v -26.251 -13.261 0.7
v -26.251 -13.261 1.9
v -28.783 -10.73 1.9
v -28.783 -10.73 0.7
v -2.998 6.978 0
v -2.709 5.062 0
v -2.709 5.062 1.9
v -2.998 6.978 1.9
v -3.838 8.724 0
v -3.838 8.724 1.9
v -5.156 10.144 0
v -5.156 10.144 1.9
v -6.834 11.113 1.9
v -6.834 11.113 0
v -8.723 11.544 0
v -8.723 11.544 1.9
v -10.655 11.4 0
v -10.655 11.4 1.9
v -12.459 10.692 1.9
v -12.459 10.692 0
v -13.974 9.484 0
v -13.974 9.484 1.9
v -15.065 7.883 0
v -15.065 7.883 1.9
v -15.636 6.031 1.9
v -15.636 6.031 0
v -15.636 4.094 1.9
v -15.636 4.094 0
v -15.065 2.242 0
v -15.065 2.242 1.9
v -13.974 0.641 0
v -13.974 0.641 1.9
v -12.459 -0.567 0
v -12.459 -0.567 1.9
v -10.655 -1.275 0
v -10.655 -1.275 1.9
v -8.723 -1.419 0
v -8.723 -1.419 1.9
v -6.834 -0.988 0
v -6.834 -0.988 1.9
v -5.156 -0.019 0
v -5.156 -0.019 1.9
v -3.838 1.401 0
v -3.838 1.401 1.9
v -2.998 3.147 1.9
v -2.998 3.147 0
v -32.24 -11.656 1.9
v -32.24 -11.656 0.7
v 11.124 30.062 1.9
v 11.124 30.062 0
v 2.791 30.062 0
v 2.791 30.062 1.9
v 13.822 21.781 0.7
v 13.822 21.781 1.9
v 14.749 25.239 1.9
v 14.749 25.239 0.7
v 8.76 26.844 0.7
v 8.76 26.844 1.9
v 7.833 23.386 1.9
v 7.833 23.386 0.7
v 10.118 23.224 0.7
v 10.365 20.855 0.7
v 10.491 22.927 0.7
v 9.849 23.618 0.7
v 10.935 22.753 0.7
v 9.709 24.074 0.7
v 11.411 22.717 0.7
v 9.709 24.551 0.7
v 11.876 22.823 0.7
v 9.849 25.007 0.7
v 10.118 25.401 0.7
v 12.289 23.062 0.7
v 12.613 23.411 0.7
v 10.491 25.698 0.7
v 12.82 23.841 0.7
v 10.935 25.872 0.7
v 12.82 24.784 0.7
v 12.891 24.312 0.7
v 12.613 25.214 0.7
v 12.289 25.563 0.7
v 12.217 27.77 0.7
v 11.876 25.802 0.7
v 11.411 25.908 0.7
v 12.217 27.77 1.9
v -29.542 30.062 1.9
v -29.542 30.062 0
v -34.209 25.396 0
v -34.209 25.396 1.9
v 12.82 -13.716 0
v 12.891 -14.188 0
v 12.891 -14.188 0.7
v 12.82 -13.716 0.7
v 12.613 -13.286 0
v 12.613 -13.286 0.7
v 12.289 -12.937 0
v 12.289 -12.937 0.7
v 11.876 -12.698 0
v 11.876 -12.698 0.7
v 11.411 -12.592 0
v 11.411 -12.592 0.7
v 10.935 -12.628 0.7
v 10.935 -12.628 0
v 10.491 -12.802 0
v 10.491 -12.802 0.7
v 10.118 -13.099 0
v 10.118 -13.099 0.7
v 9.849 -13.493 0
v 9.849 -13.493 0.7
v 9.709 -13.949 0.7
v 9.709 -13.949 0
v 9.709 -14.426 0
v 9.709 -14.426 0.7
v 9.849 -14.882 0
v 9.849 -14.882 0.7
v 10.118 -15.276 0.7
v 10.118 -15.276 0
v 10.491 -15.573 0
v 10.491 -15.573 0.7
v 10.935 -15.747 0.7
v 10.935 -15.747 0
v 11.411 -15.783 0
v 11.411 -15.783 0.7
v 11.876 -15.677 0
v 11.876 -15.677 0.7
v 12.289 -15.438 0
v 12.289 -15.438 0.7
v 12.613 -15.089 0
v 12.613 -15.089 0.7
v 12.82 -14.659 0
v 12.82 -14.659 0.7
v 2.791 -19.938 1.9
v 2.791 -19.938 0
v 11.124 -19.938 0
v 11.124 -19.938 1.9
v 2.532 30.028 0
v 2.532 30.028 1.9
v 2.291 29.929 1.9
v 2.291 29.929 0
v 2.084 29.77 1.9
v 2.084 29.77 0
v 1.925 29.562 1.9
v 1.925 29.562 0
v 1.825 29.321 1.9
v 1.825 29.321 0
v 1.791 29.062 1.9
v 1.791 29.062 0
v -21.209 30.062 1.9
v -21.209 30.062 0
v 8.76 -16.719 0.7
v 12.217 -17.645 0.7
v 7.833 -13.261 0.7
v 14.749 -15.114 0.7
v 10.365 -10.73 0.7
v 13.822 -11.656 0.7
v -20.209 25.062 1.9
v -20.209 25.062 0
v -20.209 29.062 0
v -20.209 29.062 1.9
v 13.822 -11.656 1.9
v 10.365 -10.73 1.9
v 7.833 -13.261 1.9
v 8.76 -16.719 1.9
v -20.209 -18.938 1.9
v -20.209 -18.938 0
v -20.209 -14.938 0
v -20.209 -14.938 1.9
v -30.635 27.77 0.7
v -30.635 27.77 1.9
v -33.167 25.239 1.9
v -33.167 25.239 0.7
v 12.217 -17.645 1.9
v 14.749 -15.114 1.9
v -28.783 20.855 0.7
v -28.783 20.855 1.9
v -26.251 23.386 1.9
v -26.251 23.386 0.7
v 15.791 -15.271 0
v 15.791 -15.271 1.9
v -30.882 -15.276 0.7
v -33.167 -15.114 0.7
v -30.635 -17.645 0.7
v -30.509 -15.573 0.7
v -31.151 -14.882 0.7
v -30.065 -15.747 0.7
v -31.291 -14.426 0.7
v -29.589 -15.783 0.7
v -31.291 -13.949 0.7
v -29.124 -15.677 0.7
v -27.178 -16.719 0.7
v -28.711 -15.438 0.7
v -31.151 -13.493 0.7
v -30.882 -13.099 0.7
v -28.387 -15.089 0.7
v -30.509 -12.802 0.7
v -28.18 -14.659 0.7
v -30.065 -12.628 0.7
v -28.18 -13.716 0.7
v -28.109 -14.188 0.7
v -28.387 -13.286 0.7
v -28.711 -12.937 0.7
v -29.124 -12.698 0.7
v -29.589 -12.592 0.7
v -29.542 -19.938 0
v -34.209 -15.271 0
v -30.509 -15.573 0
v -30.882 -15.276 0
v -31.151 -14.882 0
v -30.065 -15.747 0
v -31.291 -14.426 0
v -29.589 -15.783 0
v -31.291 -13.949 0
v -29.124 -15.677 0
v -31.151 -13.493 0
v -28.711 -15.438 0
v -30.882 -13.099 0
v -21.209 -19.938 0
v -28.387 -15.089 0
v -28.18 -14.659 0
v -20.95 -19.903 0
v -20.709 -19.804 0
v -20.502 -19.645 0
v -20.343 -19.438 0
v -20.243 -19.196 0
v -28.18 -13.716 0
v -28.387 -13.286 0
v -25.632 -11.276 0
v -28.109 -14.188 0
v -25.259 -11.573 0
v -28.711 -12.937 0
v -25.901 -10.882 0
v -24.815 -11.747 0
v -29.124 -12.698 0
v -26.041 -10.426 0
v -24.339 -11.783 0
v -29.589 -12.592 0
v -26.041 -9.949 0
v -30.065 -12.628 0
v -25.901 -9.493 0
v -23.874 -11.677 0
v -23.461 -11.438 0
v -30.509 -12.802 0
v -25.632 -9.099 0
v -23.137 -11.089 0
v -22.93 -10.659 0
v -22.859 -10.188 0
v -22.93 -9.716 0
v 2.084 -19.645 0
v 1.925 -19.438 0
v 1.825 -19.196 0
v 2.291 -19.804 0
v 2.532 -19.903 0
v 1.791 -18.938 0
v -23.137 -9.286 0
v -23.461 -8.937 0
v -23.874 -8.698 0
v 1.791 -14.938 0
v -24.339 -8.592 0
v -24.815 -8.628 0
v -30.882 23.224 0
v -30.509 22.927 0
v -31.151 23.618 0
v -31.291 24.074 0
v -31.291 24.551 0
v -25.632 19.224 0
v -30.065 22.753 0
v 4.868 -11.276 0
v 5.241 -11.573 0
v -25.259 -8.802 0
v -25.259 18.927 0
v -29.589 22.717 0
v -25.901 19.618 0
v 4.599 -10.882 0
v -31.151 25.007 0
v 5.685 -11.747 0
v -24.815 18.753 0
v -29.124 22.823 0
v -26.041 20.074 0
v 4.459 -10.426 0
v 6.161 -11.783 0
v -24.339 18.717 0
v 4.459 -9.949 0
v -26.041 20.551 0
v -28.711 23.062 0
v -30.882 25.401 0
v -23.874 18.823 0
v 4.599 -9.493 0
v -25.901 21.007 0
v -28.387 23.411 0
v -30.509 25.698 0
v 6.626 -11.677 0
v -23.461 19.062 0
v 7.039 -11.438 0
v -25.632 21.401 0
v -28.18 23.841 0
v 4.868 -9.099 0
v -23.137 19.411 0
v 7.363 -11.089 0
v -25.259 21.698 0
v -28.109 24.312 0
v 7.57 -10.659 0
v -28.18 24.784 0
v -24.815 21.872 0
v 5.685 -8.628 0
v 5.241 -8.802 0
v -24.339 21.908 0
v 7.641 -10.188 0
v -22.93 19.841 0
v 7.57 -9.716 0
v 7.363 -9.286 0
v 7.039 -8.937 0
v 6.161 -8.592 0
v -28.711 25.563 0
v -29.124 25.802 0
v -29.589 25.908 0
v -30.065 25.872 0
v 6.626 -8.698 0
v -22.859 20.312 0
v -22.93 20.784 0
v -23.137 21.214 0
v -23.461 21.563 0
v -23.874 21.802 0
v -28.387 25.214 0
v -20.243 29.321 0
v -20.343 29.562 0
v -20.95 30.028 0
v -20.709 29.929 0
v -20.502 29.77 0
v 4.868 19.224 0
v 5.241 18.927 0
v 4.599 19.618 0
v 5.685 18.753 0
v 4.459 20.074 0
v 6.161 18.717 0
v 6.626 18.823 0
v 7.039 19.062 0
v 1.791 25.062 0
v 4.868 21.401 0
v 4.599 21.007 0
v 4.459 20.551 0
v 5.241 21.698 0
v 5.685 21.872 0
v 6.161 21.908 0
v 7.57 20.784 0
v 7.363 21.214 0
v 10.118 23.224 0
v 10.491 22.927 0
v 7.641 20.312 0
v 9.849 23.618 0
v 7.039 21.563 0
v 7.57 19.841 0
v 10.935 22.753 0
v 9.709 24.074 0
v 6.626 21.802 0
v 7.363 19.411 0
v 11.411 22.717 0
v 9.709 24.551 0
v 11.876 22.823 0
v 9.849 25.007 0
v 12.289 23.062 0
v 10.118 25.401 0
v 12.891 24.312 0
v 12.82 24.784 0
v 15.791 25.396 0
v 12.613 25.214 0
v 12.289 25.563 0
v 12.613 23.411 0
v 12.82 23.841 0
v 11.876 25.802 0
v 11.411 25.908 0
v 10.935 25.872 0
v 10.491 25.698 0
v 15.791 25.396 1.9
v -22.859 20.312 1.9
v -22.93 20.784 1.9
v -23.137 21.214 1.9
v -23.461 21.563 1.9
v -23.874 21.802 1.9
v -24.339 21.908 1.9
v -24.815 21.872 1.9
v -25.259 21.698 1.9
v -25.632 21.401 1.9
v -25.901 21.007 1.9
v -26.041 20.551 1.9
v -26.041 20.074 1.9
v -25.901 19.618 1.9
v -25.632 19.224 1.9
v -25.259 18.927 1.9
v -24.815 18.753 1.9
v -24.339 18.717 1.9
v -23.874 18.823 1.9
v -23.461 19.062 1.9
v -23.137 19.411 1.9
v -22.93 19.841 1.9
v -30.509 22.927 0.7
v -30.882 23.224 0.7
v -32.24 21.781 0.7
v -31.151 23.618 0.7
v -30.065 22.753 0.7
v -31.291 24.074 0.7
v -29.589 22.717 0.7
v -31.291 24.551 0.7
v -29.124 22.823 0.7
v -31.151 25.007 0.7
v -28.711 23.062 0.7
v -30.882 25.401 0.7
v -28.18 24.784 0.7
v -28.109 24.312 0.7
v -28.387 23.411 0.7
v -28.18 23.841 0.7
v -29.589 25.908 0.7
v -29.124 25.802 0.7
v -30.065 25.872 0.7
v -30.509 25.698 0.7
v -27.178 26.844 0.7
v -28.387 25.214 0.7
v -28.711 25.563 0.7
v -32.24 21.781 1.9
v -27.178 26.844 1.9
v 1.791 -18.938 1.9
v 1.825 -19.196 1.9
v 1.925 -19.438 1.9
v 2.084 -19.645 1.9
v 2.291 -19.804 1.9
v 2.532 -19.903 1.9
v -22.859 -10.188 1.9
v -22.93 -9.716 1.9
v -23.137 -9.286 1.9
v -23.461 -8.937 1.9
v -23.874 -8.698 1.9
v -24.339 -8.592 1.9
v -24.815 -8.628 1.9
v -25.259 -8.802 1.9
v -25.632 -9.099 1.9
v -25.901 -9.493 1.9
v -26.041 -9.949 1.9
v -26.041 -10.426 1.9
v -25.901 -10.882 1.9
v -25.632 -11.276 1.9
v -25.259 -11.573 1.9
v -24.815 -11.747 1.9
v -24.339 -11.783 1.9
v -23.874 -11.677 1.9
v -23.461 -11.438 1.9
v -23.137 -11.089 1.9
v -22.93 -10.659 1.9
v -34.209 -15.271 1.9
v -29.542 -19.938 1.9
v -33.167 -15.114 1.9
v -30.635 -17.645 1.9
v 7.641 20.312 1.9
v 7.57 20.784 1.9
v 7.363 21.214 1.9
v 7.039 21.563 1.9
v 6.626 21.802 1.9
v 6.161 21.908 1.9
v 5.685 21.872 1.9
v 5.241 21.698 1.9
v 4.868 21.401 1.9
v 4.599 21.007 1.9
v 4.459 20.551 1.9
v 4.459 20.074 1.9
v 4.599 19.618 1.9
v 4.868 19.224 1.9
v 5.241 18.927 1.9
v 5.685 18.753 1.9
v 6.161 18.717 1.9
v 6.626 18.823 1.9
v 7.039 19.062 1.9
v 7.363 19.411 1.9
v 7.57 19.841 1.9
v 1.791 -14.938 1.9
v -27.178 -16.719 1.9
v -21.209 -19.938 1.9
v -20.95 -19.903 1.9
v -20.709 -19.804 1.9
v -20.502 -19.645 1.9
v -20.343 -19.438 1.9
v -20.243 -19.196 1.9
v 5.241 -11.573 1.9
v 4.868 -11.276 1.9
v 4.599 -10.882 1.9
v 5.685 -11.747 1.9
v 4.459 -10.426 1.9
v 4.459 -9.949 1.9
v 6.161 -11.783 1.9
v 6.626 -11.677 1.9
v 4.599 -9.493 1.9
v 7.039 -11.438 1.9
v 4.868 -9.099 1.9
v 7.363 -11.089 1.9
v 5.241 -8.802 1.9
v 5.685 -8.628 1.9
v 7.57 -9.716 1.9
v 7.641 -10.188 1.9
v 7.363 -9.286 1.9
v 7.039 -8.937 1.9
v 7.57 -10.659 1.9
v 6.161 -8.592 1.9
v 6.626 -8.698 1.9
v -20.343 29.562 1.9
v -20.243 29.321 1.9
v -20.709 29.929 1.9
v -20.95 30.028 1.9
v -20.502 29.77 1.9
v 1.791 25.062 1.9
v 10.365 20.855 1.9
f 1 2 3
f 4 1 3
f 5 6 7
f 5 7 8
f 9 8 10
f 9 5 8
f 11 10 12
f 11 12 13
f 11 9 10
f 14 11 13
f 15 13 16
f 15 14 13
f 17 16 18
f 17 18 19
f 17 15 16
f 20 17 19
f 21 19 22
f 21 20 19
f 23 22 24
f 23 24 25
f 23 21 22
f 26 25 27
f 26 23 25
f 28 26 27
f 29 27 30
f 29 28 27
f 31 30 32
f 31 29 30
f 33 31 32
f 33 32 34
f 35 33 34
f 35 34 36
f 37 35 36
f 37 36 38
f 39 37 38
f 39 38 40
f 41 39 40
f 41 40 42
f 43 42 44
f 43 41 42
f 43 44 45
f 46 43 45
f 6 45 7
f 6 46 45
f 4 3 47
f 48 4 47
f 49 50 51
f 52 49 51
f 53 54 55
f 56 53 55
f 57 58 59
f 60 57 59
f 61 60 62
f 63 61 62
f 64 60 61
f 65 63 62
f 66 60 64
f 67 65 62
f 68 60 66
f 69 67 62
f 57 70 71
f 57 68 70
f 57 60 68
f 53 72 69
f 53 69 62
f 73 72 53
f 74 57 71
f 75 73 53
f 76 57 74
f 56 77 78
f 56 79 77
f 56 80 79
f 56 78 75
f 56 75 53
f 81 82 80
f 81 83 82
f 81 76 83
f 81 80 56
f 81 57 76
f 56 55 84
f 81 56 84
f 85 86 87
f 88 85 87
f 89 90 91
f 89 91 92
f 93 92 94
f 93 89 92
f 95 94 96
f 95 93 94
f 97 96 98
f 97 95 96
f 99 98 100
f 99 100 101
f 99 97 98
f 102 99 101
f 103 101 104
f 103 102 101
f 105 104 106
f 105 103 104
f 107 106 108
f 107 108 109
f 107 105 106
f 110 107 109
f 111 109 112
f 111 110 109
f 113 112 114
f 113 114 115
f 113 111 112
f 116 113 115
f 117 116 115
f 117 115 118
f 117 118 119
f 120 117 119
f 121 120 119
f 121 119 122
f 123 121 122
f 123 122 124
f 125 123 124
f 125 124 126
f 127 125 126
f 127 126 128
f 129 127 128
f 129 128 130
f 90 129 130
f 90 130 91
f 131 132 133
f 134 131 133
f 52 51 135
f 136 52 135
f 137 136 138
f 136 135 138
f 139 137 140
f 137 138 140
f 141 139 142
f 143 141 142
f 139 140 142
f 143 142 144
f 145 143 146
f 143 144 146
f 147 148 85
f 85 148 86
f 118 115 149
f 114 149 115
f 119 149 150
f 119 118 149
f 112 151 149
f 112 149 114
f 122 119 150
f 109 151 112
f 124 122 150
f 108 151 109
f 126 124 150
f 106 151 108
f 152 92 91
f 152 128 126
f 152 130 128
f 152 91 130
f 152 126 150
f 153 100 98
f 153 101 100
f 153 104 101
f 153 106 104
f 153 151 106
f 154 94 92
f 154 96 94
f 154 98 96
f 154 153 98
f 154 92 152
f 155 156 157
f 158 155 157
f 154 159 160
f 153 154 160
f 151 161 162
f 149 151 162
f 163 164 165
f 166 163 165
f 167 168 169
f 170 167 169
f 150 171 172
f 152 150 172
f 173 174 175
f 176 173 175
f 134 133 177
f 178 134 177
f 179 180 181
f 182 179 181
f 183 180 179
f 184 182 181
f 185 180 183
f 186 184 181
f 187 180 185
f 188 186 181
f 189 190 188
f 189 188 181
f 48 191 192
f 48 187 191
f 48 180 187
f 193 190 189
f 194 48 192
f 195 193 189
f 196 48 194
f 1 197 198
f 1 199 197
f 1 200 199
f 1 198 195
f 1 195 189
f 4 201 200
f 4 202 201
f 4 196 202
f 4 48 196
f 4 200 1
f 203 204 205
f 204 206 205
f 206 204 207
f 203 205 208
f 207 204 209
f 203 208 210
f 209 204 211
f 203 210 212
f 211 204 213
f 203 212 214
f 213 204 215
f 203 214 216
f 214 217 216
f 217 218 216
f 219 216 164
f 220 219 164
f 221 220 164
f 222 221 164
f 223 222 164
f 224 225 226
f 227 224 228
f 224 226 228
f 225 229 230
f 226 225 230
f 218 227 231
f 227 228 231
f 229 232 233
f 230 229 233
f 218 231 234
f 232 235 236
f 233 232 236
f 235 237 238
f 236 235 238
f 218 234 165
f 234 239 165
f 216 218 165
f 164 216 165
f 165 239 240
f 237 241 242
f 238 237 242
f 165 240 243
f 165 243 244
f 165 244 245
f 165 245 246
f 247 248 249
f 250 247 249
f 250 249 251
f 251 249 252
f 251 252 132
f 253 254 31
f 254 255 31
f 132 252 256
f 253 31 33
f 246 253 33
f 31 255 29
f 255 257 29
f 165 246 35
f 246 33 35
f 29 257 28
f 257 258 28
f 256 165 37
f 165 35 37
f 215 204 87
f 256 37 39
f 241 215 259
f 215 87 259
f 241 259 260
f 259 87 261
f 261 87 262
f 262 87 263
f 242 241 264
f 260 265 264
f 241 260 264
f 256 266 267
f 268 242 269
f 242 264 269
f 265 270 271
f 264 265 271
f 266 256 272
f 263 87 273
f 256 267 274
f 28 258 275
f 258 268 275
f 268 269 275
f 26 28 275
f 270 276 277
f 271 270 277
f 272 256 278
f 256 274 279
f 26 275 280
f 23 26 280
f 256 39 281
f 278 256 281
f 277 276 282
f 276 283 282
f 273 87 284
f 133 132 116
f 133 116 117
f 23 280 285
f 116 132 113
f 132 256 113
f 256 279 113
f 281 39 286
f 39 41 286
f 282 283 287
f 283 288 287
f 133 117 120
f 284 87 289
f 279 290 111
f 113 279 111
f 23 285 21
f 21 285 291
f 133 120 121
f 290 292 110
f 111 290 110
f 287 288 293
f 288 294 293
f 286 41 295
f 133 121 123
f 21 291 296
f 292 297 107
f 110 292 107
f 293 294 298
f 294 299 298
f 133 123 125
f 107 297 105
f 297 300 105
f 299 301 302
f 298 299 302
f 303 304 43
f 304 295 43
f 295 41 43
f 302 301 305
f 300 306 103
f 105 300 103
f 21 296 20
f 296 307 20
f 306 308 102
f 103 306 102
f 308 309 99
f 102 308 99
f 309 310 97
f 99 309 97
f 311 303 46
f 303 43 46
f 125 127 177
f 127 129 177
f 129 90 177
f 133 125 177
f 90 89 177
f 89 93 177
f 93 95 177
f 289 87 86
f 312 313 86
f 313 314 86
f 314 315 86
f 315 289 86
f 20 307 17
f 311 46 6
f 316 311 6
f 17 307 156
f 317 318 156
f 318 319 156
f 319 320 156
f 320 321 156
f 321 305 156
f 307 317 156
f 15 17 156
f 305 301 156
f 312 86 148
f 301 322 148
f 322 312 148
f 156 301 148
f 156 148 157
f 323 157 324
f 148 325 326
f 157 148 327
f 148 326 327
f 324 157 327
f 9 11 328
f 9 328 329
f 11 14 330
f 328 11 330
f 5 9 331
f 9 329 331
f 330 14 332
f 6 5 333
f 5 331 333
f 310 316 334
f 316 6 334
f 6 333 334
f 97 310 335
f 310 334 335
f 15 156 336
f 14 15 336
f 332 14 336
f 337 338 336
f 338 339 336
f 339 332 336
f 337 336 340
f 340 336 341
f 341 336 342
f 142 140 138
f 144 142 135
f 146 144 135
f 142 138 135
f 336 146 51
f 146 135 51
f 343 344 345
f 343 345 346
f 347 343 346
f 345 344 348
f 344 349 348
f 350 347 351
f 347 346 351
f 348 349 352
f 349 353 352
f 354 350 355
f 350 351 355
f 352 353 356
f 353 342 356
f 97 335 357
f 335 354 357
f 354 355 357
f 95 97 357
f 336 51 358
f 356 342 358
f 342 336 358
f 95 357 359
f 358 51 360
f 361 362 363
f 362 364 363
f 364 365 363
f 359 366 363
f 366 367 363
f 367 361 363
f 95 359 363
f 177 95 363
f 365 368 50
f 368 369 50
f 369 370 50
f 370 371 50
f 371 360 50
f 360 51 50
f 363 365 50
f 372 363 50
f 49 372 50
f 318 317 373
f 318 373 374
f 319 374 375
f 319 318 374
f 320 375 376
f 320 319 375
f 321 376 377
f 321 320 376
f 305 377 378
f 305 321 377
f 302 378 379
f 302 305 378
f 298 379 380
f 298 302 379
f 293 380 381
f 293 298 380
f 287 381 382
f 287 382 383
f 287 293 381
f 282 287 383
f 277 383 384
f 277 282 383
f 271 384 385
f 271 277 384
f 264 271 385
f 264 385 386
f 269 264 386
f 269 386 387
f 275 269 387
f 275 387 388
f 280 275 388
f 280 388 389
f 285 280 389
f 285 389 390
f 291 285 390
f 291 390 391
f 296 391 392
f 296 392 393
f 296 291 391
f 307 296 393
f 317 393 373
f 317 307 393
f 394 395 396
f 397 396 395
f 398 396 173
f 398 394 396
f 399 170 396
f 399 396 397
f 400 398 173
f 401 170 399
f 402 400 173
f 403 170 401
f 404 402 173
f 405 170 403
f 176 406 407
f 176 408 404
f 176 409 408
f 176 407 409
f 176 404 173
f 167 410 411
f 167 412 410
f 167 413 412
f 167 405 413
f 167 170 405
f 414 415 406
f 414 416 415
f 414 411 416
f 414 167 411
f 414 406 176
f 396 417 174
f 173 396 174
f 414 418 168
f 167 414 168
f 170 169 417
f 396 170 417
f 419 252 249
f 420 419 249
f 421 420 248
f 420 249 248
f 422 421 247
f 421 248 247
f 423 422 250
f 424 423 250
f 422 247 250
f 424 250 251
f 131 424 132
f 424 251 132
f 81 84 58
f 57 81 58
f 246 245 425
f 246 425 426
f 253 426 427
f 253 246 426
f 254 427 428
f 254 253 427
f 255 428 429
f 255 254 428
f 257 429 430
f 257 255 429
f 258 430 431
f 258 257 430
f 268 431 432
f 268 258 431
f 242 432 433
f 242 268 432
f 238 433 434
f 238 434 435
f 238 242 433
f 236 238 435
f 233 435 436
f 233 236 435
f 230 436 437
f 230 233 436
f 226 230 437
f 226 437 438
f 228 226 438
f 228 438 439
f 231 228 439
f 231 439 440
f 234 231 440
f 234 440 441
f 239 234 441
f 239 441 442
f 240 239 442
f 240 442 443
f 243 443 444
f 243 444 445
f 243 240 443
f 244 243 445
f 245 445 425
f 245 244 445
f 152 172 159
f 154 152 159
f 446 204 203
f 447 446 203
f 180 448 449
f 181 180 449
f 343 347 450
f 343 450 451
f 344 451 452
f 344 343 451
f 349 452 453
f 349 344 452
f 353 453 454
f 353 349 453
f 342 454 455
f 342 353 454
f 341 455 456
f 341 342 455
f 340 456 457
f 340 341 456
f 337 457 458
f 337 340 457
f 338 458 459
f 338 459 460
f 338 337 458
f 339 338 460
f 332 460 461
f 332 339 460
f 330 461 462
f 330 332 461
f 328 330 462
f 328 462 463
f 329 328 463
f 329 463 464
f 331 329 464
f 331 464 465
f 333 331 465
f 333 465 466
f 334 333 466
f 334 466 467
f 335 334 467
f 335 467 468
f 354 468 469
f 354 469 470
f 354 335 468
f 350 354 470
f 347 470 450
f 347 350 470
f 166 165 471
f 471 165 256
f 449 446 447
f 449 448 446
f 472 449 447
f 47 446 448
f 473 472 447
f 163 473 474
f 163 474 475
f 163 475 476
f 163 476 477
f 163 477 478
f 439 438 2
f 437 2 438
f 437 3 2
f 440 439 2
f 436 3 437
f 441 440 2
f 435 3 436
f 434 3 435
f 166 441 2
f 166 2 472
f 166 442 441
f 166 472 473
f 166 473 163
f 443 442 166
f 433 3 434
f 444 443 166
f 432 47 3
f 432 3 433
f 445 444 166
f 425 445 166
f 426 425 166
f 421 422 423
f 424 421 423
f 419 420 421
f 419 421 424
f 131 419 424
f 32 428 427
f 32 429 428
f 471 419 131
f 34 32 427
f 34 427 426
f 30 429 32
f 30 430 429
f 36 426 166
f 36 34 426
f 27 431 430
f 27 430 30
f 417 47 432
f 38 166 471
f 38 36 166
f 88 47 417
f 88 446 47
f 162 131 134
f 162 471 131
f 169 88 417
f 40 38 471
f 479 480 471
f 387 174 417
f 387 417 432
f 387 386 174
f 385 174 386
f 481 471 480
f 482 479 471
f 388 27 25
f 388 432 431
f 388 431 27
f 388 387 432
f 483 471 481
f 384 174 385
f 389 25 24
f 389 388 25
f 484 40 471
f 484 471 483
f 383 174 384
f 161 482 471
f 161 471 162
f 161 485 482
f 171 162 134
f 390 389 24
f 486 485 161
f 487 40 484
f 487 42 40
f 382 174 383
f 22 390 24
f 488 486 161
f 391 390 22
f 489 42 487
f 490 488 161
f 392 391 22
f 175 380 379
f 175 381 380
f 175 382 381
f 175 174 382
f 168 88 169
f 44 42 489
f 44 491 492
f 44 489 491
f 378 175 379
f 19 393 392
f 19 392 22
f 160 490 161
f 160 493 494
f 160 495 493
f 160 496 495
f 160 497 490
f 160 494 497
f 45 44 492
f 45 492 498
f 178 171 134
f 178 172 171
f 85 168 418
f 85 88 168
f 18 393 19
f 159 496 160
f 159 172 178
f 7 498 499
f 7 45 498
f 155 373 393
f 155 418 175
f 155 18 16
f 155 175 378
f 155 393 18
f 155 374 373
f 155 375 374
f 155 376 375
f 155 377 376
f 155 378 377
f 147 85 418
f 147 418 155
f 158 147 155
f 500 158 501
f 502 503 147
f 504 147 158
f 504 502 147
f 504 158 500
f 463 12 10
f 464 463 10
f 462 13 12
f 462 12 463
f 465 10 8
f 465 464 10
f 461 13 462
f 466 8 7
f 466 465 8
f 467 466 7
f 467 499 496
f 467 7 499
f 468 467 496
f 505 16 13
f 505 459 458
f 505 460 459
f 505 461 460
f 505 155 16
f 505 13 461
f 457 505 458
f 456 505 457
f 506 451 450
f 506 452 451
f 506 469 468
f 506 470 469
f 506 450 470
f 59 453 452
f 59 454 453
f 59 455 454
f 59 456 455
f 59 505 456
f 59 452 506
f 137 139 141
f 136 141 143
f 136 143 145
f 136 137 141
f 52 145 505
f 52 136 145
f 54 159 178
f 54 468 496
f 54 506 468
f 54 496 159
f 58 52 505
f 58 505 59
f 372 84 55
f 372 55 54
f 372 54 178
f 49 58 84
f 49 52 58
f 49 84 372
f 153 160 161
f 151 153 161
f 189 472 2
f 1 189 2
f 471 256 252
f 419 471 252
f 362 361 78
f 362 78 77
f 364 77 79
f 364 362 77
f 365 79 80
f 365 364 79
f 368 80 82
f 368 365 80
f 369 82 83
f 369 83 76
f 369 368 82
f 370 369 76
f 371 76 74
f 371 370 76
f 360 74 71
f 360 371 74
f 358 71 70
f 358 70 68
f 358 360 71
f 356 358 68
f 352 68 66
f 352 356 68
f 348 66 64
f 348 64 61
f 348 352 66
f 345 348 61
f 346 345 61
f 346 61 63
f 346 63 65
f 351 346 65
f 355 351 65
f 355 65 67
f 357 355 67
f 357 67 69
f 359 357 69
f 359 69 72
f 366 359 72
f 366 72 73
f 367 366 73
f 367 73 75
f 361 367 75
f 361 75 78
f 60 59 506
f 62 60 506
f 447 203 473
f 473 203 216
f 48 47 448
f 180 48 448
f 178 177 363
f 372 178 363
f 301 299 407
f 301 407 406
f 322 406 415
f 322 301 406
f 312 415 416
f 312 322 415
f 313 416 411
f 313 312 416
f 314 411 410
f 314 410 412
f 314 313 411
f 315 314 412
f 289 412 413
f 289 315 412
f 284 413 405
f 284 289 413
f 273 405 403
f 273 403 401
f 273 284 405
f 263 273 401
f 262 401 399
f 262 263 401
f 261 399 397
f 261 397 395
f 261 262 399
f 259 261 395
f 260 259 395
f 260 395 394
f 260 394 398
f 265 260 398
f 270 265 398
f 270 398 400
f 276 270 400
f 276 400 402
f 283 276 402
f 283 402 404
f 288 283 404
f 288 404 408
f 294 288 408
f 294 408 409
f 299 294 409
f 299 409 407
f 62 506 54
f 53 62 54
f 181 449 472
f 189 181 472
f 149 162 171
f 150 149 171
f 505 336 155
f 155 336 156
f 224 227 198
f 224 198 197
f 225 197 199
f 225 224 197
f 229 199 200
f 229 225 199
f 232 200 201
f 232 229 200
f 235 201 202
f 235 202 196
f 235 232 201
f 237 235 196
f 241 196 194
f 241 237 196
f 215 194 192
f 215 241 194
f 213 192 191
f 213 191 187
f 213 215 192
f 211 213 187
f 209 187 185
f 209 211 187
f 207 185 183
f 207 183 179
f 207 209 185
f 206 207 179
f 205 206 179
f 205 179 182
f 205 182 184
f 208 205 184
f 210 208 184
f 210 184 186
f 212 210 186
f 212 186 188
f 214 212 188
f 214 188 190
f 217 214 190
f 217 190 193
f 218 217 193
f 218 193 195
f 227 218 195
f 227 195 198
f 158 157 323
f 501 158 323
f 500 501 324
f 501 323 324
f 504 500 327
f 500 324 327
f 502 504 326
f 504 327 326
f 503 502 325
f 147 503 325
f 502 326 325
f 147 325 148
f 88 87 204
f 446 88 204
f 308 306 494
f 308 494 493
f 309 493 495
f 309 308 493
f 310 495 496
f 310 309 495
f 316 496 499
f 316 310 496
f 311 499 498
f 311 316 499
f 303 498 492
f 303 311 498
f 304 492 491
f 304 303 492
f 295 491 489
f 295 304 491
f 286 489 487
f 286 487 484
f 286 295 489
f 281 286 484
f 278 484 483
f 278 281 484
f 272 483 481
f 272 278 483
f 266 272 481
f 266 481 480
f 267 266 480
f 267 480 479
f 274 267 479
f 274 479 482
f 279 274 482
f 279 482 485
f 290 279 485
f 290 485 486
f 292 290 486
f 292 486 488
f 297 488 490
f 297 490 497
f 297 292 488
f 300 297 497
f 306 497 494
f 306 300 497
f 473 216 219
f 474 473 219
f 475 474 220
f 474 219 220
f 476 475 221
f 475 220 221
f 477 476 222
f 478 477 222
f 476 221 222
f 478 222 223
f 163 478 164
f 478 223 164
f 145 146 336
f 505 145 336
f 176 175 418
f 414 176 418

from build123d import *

# Parameters (mm, degrees)
F0_R     = 1.6
F0_R_2   = 6.5
F1_DEPTH = 1.9
F2_R     = 1.6
F3_DEPTH = 1.2


# Not quite as in the source:
# - a feature names something its author has since deleted; it is built from what else it names


with BuildPart() as f1:
    # F0 (on Top) → F1 (new body)
    with BuildSketch(Plane.XY):
        with BuildLine():
            Line((15.7910159975, 25.3955767816), (11.1241112417, 30.0624815375))
            Line((11.1241112417, 30.0624815375), (2.7910159975, 30.0624815375))
            ThreePointArc((2.7910159975, 30.0624815375), (2.0839092163, 29.7695883186), (1.7910159975, 29.0624815375))
            Line((1.7910159975, 29.0624815375), (1.7910159975, 25.0624815375))
            Line((1.7910159975, 25.0624815375), (-20.2089840025, 25.0624815375))
            Line((-20.2089840025, 25.0624815375), (-20.2089840025, 29.0624815375))
            ThreePointArc((-20.2089840025, 29.0624815375), (-20.5018772213, 29.7695883186), (-21.2089840025, 30.0624815375))
            Line((-21.2089840025, 30.0624815375), (-29.5420792466, 30.0624815375))
            Line((-29.5420792466, 30.0624815375), (-34.2089840025, 25.3955767816))
            Line((-34.2089840025, 25.3955767816), (-34.2089840025, -15.2706137067))
            Line((-34.2089840025, -15.2706137067), (-29.5420792466, -19.9375184625))
            Line((-29.5420792466, -19.9375184625), (-21.2089840025, -19.9375184625))
            ThreePointArc((-21.2089840025, -19.9375184625), (-20.5018772213, -19.6446252437), (-20.2089840025, -18.9375184625))
            Line((-20.2089840025, -18.9375184625), (-20.2089840025, -14.9375184625))
            Line((-20.2089840025, -14.9375184625), (1.7910159975, -14.9375184625))
            Line((1.7910159975, -14.9375184625), (1.7910159975, -18.9375184625))
            ThreePointArc((1.7910159975, -18.9375184625), (2.0839092163, -19.6446252437), (2.7910159975, -19.9375184625))
            Line((2.7910159975, -19.9375184625), (11.1241112417, -19.9375184625))
            Line((11.1241112417, -19.9375184625), (15.7910159975, -15.2706137067))
            Line((15.7910159975, -15.2706137067), (15.7910159975, 25.3955767816))
        make_face()
        with Locations((-29.7089840025, -14.1875184625)):
            Circle(F0_R, mode=Mode.SUBTRACT)
        with Locations((-24.4589840025, -10.1875184625)):
            Circle(F0_R, mode=Mode.SUBTRACT)
        with Locations((11.2910159975, -14.1875184625)):
            Circle(F0_R, mode=Mode.SUBTRACT)
        with Locations((6.0410159975, -10.1875184625)):
            Circle(F0_R, mode=Mode.SUBTRACT)
        with Locations((-24.4589840025, 20.3124815375)):
            Circle(F0_R, mode=Mode.SUBTRACT)
        with Locations((-29.7089840025, 24.3124815375)):
            Circle(F0_R, mode=Mode.SUBTRACT)
        with Locations((-9.2089840025, 5.0624815375)):
            Circle(F0_R_2, mode=Mode.SUBTRACT)
        with Locations((6.0410159975, 20.3124815375)):
            Circle(F0_R, mode=Mode.SUBTRACT)
        with Locations((11.2910159975, 24.3124815375)):
            Circle(F0_R, mode=Mode.SUBTRACT)
    extrude(amount=F1_DEPTH)

    # F2 (on face) → F3 (cut)
    with BuildSketch(Plane.XY.offset(1.9)):
        Polygon((-30.6354453237, 27.7700822596), (-33.1665847246, 25.2389428587), (-32.2401234033, 21.7813421366), (-28.7825226812, 20.8548808153), (-26.2513832804, 23.3860202162), (-27.1778446016, 26.8436209383), align=None)
        with Locations((-29.7089840025, 24.3124815375)):
            Circle(F2_R, mode=Mode.SUBTRACT)
        Polygon((14.7486167196, 25.2389428587), (12.2174773188, 27.7700822596), (8.7598765967, 26.8436209383), (7.8334152754, 23.3860202162), (10.3645546763, 20.8548808153), (13.8221553984, 21.7813421366), align=None)
        with Locations((11.2910159975, 24.3124815375)):
            Circle(F2_R, mode=Mode.SUBTRACT)
        Polygon((12.2174773188, -17.6451191847), (14.7486167196, -15.1139797838), (13.8221553984, -11.6563790617), (10.3645546763, -10.7299177404), (7.8334152754, -13.2610571413), (8.7598765967, -16.7186578634), align=None)
        with Locations((11.2910159975, -14.1875184625)):
            Circle(F2_R, mode=Mode.SUBTRACT)
        Polygon((-33.1665847246, -15.1139797838), (-30.6354453237, -17.6451191847), (-27.1778446016, -16.7186578634), (-26.2513832804, -13.2610571413), (-28.7825226812, -10.7299177404), (-32.2401234033, -11.6563790617), align=None)
        with Locations((-29.7089840025, -14.1875184625)):
            Circle(F2_R, mode=Mode.SUBTRACT)
    extrude(amount=-F3_DEPTH, mode=Mode.SUBTRACT)


solid = f1.part
